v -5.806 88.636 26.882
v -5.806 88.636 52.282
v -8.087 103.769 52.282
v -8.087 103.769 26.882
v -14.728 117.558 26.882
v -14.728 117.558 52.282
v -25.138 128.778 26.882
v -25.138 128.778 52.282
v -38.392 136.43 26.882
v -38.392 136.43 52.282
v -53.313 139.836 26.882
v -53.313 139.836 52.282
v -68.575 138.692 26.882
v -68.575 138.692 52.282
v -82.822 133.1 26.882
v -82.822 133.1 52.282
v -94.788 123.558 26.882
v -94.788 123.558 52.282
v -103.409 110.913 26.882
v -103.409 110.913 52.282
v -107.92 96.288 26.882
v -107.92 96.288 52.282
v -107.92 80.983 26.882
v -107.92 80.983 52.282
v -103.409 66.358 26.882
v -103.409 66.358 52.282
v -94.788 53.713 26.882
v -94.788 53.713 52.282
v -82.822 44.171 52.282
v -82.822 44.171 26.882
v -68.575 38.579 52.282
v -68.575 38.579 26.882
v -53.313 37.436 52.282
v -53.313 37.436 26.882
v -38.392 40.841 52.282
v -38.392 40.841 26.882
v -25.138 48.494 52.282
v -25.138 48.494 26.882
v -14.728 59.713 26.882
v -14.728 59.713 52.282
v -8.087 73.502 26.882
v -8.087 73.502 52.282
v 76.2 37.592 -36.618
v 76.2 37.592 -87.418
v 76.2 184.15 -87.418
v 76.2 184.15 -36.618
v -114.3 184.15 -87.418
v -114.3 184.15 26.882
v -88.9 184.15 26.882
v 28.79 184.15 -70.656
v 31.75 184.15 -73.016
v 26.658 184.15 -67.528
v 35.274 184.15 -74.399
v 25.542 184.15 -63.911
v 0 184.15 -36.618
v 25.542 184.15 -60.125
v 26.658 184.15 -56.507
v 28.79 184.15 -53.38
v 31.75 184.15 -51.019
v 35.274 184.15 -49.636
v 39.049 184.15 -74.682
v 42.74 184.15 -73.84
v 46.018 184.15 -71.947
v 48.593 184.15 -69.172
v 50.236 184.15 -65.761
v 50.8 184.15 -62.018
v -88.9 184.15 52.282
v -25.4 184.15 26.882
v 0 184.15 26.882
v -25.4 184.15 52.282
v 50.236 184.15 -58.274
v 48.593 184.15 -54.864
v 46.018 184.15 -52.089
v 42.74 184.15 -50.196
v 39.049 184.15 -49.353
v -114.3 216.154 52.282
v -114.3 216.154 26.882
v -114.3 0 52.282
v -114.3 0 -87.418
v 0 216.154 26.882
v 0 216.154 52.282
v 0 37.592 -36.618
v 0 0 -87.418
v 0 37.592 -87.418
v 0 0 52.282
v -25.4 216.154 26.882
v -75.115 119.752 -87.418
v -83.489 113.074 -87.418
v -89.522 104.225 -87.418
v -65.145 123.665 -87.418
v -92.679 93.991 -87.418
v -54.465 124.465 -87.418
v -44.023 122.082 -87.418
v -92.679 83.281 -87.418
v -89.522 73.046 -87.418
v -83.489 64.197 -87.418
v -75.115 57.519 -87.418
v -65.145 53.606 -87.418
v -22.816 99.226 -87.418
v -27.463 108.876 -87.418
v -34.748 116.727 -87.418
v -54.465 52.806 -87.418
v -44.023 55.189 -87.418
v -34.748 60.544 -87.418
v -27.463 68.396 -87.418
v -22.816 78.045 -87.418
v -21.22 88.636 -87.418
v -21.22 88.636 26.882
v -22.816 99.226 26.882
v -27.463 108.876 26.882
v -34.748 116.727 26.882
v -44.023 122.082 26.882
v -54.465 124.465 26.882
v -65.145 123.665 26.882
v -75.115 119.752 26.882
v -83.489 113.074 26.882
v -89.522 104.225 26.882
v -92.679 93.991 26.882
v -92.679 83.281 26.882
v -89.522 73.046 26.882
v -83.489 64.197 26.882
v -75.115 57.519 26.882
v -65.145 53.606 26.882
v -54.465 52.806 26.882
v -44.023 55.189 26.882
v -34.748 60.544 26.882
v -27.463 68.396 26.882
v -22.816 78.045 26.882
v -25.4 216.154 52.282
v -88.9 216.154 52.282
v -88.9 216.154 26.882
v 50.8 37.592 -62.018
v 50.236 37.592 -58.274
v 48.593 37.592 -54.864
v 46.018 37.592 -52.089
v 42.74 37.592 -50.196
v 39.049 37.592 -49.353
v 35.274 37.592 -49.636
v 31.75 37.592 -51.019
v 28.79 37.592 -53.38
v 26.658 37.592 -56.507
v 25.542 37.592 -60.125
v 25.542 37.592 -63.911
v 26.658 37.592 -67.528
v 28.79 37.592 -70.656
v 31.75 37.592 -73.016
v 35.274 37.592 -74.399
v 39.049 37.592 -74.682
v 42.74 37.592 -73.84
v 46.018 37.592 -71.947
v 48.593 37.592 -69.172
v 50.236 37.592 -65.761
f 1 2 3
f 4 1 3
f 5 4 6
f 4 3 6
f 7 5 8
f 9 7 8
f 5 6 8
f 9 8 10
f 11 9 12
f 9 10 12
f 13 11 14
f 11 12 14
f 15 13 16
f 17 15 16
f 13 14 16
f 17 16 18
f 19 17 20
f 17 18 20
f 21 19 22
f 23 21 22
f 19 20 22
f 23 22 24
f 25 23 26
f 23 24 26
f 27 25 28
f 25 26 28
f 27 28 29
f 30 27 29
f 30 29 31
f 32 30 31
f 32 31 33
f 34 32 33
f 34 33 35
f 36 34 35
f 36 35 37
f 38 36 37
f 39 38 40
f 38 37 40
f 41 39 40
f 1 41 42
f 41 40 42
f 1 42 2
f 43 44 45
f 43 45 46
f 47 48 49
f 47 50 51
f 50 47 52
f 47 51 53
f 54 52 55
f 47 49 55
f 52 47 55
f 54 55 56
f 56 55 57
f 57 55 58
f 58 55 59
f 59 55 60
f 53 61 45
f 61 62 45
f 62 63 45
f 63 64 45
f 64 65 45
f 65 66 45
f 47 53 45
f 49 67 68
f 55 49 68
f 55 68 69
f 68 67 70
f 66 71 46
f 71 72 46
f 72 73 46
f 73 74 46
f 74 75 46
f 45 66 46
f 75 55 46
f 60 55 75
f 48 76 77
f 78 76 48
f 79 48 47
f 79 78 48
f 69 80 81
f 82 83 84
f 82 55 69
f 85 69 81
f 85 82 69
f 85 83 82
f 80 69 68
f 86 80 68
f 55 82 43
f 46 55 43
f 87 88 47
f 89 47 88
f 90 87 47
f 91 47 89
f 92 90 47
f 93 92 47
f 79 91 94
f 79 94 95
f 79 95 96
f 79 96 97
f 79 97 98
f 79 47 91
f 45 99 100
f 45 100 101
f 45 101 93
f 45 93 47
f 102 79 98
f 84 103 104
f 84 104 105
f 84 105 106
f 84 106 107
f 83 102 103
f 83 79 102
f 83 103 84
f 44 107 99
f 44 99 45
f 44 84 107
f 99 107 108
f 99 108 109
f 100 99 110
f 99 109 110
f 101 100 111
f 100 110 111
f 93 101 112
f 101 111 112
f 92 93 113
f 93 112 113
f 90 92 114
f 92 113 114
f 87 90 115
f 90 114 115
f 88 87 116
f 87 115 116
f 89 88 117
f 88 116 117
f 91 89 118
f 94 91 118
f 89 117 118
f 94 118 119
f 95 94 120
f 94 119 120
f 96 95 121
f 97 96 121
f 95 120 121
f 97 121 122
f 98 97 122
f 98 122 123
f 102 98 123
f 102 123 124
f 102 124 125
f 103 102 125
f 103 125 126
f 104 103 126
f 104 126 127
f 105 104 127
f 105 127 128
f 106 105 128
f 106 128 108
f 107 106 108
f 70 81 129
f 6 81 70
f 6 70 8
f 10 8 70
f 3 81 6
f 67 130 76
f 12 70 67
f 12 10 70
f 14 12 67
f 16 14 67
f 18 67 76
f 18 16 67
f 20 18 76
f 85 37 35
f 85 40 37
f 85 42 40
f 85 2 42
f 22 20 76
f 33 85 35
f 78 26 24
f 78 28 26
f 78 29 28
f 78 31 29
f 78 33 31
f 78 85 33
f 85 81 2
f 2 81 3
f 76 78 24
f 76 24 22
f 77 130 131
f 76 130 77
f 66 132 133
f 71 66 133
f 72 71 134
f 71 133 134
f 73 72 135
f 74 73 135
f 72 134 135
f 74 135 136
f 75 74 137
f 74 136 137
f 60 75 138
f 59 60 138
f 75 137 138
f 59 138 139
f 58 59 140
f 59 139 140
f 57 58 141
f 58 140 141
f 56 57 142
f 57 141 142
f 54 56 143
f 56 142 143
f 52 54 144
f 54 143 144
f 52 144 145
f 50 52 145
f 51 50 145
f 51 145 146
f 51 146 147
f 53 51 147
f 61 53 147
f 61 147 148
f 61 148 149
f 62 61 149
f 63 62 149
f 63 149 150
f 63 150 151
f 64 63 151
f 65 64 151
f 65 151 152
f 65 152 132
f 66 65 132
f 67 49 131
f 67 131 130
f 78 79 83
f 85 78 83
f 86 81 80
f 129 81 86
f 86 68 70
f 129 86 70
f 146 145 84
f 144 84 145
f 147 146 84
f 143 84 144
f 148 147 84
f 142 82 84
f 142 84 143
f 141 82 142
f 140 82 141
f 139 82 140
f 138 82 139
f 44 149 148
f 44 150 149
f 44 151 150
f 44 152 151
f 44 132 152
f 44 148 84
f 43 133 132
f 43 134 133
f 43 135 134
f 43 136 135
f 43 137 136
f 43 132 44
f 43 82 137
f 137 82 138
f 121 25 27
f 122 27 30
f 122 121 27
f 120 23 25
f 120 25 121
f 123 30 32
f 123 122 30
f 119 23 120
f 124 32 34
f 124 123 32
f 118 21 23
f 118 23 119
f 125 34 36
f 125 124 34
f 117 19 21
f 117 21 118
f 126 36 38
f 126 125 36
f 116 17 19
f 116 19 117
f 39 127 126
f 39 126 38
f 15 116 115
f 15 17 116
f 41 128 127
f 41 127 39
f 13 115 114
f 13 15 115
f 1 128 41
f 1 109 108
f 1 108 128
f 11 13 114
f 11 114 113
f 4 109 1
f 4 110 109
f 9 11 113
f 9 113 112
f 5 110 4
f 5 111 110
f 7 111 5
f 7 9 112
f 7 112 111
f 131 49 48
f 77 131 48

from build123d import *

# Parameters (mm, degrees)
F0_W      = 76.2
F0_H      = 50.8
F0_R      = 12.7
F1_DEPTH  = 184.15
F2_R      = 51.343595
F2_R_2    = 35.929937
F3_DEPTH  = 25.4
F3_FACE_R = 35.929937
F4_DEPTH  = 311.15
F5_W      = 25.4
F5_H      = 25.4
F6_DEPTH  = 32.004
F7_W      = 76.2
F7_H      = 50.8
F7_R      = 12.7
F8_DEPTH  = 37.592
F9_DEPTH  = 0.762


with BuildPart() as f1:
    # F0 (on Front) → F1 (new body)
    with BuildSketch(Plane.XZ):
        Polygon((0, 52.28221), (-114.3, 52.28221), (-114.3, -87.41779), (0, -87.41779), (0, -36.61779), align=None)
        with Locations((38.1, -62.01779)):
            Rectangle(F0_W, F0_H)
        with Locations((38.1, -62.01779)):
            Circle(F0_R, mode=Mode.SUBTRACT)
    extrude(amount=-F1_DEPTH)

    # F2 (on face) → F3 (cut)
    with BuildSketch(Plane.XY.offset(52.28221)):
        with Locations((-57.15, 88.635586)):
            Circle(F2_R)
        with Locations((-57.15, 88.635586)):
            Circle(F2_R_2, mode=Mode.SUBTRACT)
    extrude(amount=-F3_DEPTH, mode=Mode.SUBTRACT)

    # F3_face (on face) → F4 (cut)
    with BuildSketch(Plane(origin=(-57.15, 88.635586, 52.28221), x_dir=(1, 0, 0), z_dir=(0, 0, 1))):
        Circle(F3_FACE_R)
    extrude(amount=-F4_DEPTH, mode=Mode.SUBTRACT)

    # F5 (on face) → F6 (join)
    with BuildSketch(Plane(origin=(0, 184.15, 0), x_dir=(-1, 0, 0), z_dir=(0, 1, 0))):
        with Locations((12.7, 39.58221)):
            Rectangle(F5_W, F5_H)
        with Locations((101.6, 39.58221)):
            Rectangle(F5_W, F5_H)
    extrude(amount=F6_DEPTH)

    # F7 (on face) → F8 (cut)
    with BuildSketch(Plane.XZ):
        with Locations((38.1, -62.01779)):
            Rectangle(F7_W, F7_H)
        with Locations((38.1, -62.01779)):
            Circle(F7_R, mode=Mode.SUBTRACT)
    extrude(amount=-F8_DEPTH, mode=Mode.SUBTRACT)

    # F6_face (on face) → F9 (join)
    with BuildSketch(Plane(origin=(-114.3, 95.38549, -15.817237), x_dir=(0, -1, 0), z_dir=(-1, 0, 0))):
        Polygon((95.38549, 68.099447), (-120.76851, 68.099447), (-120.76851, 42.699447), (-88.76451, 42.699447), (-88.76451, -71.600553), (95.38549, -71.600553), align=None)
    extrude(amount=-F9_DEPTH)


solid = f1.part
